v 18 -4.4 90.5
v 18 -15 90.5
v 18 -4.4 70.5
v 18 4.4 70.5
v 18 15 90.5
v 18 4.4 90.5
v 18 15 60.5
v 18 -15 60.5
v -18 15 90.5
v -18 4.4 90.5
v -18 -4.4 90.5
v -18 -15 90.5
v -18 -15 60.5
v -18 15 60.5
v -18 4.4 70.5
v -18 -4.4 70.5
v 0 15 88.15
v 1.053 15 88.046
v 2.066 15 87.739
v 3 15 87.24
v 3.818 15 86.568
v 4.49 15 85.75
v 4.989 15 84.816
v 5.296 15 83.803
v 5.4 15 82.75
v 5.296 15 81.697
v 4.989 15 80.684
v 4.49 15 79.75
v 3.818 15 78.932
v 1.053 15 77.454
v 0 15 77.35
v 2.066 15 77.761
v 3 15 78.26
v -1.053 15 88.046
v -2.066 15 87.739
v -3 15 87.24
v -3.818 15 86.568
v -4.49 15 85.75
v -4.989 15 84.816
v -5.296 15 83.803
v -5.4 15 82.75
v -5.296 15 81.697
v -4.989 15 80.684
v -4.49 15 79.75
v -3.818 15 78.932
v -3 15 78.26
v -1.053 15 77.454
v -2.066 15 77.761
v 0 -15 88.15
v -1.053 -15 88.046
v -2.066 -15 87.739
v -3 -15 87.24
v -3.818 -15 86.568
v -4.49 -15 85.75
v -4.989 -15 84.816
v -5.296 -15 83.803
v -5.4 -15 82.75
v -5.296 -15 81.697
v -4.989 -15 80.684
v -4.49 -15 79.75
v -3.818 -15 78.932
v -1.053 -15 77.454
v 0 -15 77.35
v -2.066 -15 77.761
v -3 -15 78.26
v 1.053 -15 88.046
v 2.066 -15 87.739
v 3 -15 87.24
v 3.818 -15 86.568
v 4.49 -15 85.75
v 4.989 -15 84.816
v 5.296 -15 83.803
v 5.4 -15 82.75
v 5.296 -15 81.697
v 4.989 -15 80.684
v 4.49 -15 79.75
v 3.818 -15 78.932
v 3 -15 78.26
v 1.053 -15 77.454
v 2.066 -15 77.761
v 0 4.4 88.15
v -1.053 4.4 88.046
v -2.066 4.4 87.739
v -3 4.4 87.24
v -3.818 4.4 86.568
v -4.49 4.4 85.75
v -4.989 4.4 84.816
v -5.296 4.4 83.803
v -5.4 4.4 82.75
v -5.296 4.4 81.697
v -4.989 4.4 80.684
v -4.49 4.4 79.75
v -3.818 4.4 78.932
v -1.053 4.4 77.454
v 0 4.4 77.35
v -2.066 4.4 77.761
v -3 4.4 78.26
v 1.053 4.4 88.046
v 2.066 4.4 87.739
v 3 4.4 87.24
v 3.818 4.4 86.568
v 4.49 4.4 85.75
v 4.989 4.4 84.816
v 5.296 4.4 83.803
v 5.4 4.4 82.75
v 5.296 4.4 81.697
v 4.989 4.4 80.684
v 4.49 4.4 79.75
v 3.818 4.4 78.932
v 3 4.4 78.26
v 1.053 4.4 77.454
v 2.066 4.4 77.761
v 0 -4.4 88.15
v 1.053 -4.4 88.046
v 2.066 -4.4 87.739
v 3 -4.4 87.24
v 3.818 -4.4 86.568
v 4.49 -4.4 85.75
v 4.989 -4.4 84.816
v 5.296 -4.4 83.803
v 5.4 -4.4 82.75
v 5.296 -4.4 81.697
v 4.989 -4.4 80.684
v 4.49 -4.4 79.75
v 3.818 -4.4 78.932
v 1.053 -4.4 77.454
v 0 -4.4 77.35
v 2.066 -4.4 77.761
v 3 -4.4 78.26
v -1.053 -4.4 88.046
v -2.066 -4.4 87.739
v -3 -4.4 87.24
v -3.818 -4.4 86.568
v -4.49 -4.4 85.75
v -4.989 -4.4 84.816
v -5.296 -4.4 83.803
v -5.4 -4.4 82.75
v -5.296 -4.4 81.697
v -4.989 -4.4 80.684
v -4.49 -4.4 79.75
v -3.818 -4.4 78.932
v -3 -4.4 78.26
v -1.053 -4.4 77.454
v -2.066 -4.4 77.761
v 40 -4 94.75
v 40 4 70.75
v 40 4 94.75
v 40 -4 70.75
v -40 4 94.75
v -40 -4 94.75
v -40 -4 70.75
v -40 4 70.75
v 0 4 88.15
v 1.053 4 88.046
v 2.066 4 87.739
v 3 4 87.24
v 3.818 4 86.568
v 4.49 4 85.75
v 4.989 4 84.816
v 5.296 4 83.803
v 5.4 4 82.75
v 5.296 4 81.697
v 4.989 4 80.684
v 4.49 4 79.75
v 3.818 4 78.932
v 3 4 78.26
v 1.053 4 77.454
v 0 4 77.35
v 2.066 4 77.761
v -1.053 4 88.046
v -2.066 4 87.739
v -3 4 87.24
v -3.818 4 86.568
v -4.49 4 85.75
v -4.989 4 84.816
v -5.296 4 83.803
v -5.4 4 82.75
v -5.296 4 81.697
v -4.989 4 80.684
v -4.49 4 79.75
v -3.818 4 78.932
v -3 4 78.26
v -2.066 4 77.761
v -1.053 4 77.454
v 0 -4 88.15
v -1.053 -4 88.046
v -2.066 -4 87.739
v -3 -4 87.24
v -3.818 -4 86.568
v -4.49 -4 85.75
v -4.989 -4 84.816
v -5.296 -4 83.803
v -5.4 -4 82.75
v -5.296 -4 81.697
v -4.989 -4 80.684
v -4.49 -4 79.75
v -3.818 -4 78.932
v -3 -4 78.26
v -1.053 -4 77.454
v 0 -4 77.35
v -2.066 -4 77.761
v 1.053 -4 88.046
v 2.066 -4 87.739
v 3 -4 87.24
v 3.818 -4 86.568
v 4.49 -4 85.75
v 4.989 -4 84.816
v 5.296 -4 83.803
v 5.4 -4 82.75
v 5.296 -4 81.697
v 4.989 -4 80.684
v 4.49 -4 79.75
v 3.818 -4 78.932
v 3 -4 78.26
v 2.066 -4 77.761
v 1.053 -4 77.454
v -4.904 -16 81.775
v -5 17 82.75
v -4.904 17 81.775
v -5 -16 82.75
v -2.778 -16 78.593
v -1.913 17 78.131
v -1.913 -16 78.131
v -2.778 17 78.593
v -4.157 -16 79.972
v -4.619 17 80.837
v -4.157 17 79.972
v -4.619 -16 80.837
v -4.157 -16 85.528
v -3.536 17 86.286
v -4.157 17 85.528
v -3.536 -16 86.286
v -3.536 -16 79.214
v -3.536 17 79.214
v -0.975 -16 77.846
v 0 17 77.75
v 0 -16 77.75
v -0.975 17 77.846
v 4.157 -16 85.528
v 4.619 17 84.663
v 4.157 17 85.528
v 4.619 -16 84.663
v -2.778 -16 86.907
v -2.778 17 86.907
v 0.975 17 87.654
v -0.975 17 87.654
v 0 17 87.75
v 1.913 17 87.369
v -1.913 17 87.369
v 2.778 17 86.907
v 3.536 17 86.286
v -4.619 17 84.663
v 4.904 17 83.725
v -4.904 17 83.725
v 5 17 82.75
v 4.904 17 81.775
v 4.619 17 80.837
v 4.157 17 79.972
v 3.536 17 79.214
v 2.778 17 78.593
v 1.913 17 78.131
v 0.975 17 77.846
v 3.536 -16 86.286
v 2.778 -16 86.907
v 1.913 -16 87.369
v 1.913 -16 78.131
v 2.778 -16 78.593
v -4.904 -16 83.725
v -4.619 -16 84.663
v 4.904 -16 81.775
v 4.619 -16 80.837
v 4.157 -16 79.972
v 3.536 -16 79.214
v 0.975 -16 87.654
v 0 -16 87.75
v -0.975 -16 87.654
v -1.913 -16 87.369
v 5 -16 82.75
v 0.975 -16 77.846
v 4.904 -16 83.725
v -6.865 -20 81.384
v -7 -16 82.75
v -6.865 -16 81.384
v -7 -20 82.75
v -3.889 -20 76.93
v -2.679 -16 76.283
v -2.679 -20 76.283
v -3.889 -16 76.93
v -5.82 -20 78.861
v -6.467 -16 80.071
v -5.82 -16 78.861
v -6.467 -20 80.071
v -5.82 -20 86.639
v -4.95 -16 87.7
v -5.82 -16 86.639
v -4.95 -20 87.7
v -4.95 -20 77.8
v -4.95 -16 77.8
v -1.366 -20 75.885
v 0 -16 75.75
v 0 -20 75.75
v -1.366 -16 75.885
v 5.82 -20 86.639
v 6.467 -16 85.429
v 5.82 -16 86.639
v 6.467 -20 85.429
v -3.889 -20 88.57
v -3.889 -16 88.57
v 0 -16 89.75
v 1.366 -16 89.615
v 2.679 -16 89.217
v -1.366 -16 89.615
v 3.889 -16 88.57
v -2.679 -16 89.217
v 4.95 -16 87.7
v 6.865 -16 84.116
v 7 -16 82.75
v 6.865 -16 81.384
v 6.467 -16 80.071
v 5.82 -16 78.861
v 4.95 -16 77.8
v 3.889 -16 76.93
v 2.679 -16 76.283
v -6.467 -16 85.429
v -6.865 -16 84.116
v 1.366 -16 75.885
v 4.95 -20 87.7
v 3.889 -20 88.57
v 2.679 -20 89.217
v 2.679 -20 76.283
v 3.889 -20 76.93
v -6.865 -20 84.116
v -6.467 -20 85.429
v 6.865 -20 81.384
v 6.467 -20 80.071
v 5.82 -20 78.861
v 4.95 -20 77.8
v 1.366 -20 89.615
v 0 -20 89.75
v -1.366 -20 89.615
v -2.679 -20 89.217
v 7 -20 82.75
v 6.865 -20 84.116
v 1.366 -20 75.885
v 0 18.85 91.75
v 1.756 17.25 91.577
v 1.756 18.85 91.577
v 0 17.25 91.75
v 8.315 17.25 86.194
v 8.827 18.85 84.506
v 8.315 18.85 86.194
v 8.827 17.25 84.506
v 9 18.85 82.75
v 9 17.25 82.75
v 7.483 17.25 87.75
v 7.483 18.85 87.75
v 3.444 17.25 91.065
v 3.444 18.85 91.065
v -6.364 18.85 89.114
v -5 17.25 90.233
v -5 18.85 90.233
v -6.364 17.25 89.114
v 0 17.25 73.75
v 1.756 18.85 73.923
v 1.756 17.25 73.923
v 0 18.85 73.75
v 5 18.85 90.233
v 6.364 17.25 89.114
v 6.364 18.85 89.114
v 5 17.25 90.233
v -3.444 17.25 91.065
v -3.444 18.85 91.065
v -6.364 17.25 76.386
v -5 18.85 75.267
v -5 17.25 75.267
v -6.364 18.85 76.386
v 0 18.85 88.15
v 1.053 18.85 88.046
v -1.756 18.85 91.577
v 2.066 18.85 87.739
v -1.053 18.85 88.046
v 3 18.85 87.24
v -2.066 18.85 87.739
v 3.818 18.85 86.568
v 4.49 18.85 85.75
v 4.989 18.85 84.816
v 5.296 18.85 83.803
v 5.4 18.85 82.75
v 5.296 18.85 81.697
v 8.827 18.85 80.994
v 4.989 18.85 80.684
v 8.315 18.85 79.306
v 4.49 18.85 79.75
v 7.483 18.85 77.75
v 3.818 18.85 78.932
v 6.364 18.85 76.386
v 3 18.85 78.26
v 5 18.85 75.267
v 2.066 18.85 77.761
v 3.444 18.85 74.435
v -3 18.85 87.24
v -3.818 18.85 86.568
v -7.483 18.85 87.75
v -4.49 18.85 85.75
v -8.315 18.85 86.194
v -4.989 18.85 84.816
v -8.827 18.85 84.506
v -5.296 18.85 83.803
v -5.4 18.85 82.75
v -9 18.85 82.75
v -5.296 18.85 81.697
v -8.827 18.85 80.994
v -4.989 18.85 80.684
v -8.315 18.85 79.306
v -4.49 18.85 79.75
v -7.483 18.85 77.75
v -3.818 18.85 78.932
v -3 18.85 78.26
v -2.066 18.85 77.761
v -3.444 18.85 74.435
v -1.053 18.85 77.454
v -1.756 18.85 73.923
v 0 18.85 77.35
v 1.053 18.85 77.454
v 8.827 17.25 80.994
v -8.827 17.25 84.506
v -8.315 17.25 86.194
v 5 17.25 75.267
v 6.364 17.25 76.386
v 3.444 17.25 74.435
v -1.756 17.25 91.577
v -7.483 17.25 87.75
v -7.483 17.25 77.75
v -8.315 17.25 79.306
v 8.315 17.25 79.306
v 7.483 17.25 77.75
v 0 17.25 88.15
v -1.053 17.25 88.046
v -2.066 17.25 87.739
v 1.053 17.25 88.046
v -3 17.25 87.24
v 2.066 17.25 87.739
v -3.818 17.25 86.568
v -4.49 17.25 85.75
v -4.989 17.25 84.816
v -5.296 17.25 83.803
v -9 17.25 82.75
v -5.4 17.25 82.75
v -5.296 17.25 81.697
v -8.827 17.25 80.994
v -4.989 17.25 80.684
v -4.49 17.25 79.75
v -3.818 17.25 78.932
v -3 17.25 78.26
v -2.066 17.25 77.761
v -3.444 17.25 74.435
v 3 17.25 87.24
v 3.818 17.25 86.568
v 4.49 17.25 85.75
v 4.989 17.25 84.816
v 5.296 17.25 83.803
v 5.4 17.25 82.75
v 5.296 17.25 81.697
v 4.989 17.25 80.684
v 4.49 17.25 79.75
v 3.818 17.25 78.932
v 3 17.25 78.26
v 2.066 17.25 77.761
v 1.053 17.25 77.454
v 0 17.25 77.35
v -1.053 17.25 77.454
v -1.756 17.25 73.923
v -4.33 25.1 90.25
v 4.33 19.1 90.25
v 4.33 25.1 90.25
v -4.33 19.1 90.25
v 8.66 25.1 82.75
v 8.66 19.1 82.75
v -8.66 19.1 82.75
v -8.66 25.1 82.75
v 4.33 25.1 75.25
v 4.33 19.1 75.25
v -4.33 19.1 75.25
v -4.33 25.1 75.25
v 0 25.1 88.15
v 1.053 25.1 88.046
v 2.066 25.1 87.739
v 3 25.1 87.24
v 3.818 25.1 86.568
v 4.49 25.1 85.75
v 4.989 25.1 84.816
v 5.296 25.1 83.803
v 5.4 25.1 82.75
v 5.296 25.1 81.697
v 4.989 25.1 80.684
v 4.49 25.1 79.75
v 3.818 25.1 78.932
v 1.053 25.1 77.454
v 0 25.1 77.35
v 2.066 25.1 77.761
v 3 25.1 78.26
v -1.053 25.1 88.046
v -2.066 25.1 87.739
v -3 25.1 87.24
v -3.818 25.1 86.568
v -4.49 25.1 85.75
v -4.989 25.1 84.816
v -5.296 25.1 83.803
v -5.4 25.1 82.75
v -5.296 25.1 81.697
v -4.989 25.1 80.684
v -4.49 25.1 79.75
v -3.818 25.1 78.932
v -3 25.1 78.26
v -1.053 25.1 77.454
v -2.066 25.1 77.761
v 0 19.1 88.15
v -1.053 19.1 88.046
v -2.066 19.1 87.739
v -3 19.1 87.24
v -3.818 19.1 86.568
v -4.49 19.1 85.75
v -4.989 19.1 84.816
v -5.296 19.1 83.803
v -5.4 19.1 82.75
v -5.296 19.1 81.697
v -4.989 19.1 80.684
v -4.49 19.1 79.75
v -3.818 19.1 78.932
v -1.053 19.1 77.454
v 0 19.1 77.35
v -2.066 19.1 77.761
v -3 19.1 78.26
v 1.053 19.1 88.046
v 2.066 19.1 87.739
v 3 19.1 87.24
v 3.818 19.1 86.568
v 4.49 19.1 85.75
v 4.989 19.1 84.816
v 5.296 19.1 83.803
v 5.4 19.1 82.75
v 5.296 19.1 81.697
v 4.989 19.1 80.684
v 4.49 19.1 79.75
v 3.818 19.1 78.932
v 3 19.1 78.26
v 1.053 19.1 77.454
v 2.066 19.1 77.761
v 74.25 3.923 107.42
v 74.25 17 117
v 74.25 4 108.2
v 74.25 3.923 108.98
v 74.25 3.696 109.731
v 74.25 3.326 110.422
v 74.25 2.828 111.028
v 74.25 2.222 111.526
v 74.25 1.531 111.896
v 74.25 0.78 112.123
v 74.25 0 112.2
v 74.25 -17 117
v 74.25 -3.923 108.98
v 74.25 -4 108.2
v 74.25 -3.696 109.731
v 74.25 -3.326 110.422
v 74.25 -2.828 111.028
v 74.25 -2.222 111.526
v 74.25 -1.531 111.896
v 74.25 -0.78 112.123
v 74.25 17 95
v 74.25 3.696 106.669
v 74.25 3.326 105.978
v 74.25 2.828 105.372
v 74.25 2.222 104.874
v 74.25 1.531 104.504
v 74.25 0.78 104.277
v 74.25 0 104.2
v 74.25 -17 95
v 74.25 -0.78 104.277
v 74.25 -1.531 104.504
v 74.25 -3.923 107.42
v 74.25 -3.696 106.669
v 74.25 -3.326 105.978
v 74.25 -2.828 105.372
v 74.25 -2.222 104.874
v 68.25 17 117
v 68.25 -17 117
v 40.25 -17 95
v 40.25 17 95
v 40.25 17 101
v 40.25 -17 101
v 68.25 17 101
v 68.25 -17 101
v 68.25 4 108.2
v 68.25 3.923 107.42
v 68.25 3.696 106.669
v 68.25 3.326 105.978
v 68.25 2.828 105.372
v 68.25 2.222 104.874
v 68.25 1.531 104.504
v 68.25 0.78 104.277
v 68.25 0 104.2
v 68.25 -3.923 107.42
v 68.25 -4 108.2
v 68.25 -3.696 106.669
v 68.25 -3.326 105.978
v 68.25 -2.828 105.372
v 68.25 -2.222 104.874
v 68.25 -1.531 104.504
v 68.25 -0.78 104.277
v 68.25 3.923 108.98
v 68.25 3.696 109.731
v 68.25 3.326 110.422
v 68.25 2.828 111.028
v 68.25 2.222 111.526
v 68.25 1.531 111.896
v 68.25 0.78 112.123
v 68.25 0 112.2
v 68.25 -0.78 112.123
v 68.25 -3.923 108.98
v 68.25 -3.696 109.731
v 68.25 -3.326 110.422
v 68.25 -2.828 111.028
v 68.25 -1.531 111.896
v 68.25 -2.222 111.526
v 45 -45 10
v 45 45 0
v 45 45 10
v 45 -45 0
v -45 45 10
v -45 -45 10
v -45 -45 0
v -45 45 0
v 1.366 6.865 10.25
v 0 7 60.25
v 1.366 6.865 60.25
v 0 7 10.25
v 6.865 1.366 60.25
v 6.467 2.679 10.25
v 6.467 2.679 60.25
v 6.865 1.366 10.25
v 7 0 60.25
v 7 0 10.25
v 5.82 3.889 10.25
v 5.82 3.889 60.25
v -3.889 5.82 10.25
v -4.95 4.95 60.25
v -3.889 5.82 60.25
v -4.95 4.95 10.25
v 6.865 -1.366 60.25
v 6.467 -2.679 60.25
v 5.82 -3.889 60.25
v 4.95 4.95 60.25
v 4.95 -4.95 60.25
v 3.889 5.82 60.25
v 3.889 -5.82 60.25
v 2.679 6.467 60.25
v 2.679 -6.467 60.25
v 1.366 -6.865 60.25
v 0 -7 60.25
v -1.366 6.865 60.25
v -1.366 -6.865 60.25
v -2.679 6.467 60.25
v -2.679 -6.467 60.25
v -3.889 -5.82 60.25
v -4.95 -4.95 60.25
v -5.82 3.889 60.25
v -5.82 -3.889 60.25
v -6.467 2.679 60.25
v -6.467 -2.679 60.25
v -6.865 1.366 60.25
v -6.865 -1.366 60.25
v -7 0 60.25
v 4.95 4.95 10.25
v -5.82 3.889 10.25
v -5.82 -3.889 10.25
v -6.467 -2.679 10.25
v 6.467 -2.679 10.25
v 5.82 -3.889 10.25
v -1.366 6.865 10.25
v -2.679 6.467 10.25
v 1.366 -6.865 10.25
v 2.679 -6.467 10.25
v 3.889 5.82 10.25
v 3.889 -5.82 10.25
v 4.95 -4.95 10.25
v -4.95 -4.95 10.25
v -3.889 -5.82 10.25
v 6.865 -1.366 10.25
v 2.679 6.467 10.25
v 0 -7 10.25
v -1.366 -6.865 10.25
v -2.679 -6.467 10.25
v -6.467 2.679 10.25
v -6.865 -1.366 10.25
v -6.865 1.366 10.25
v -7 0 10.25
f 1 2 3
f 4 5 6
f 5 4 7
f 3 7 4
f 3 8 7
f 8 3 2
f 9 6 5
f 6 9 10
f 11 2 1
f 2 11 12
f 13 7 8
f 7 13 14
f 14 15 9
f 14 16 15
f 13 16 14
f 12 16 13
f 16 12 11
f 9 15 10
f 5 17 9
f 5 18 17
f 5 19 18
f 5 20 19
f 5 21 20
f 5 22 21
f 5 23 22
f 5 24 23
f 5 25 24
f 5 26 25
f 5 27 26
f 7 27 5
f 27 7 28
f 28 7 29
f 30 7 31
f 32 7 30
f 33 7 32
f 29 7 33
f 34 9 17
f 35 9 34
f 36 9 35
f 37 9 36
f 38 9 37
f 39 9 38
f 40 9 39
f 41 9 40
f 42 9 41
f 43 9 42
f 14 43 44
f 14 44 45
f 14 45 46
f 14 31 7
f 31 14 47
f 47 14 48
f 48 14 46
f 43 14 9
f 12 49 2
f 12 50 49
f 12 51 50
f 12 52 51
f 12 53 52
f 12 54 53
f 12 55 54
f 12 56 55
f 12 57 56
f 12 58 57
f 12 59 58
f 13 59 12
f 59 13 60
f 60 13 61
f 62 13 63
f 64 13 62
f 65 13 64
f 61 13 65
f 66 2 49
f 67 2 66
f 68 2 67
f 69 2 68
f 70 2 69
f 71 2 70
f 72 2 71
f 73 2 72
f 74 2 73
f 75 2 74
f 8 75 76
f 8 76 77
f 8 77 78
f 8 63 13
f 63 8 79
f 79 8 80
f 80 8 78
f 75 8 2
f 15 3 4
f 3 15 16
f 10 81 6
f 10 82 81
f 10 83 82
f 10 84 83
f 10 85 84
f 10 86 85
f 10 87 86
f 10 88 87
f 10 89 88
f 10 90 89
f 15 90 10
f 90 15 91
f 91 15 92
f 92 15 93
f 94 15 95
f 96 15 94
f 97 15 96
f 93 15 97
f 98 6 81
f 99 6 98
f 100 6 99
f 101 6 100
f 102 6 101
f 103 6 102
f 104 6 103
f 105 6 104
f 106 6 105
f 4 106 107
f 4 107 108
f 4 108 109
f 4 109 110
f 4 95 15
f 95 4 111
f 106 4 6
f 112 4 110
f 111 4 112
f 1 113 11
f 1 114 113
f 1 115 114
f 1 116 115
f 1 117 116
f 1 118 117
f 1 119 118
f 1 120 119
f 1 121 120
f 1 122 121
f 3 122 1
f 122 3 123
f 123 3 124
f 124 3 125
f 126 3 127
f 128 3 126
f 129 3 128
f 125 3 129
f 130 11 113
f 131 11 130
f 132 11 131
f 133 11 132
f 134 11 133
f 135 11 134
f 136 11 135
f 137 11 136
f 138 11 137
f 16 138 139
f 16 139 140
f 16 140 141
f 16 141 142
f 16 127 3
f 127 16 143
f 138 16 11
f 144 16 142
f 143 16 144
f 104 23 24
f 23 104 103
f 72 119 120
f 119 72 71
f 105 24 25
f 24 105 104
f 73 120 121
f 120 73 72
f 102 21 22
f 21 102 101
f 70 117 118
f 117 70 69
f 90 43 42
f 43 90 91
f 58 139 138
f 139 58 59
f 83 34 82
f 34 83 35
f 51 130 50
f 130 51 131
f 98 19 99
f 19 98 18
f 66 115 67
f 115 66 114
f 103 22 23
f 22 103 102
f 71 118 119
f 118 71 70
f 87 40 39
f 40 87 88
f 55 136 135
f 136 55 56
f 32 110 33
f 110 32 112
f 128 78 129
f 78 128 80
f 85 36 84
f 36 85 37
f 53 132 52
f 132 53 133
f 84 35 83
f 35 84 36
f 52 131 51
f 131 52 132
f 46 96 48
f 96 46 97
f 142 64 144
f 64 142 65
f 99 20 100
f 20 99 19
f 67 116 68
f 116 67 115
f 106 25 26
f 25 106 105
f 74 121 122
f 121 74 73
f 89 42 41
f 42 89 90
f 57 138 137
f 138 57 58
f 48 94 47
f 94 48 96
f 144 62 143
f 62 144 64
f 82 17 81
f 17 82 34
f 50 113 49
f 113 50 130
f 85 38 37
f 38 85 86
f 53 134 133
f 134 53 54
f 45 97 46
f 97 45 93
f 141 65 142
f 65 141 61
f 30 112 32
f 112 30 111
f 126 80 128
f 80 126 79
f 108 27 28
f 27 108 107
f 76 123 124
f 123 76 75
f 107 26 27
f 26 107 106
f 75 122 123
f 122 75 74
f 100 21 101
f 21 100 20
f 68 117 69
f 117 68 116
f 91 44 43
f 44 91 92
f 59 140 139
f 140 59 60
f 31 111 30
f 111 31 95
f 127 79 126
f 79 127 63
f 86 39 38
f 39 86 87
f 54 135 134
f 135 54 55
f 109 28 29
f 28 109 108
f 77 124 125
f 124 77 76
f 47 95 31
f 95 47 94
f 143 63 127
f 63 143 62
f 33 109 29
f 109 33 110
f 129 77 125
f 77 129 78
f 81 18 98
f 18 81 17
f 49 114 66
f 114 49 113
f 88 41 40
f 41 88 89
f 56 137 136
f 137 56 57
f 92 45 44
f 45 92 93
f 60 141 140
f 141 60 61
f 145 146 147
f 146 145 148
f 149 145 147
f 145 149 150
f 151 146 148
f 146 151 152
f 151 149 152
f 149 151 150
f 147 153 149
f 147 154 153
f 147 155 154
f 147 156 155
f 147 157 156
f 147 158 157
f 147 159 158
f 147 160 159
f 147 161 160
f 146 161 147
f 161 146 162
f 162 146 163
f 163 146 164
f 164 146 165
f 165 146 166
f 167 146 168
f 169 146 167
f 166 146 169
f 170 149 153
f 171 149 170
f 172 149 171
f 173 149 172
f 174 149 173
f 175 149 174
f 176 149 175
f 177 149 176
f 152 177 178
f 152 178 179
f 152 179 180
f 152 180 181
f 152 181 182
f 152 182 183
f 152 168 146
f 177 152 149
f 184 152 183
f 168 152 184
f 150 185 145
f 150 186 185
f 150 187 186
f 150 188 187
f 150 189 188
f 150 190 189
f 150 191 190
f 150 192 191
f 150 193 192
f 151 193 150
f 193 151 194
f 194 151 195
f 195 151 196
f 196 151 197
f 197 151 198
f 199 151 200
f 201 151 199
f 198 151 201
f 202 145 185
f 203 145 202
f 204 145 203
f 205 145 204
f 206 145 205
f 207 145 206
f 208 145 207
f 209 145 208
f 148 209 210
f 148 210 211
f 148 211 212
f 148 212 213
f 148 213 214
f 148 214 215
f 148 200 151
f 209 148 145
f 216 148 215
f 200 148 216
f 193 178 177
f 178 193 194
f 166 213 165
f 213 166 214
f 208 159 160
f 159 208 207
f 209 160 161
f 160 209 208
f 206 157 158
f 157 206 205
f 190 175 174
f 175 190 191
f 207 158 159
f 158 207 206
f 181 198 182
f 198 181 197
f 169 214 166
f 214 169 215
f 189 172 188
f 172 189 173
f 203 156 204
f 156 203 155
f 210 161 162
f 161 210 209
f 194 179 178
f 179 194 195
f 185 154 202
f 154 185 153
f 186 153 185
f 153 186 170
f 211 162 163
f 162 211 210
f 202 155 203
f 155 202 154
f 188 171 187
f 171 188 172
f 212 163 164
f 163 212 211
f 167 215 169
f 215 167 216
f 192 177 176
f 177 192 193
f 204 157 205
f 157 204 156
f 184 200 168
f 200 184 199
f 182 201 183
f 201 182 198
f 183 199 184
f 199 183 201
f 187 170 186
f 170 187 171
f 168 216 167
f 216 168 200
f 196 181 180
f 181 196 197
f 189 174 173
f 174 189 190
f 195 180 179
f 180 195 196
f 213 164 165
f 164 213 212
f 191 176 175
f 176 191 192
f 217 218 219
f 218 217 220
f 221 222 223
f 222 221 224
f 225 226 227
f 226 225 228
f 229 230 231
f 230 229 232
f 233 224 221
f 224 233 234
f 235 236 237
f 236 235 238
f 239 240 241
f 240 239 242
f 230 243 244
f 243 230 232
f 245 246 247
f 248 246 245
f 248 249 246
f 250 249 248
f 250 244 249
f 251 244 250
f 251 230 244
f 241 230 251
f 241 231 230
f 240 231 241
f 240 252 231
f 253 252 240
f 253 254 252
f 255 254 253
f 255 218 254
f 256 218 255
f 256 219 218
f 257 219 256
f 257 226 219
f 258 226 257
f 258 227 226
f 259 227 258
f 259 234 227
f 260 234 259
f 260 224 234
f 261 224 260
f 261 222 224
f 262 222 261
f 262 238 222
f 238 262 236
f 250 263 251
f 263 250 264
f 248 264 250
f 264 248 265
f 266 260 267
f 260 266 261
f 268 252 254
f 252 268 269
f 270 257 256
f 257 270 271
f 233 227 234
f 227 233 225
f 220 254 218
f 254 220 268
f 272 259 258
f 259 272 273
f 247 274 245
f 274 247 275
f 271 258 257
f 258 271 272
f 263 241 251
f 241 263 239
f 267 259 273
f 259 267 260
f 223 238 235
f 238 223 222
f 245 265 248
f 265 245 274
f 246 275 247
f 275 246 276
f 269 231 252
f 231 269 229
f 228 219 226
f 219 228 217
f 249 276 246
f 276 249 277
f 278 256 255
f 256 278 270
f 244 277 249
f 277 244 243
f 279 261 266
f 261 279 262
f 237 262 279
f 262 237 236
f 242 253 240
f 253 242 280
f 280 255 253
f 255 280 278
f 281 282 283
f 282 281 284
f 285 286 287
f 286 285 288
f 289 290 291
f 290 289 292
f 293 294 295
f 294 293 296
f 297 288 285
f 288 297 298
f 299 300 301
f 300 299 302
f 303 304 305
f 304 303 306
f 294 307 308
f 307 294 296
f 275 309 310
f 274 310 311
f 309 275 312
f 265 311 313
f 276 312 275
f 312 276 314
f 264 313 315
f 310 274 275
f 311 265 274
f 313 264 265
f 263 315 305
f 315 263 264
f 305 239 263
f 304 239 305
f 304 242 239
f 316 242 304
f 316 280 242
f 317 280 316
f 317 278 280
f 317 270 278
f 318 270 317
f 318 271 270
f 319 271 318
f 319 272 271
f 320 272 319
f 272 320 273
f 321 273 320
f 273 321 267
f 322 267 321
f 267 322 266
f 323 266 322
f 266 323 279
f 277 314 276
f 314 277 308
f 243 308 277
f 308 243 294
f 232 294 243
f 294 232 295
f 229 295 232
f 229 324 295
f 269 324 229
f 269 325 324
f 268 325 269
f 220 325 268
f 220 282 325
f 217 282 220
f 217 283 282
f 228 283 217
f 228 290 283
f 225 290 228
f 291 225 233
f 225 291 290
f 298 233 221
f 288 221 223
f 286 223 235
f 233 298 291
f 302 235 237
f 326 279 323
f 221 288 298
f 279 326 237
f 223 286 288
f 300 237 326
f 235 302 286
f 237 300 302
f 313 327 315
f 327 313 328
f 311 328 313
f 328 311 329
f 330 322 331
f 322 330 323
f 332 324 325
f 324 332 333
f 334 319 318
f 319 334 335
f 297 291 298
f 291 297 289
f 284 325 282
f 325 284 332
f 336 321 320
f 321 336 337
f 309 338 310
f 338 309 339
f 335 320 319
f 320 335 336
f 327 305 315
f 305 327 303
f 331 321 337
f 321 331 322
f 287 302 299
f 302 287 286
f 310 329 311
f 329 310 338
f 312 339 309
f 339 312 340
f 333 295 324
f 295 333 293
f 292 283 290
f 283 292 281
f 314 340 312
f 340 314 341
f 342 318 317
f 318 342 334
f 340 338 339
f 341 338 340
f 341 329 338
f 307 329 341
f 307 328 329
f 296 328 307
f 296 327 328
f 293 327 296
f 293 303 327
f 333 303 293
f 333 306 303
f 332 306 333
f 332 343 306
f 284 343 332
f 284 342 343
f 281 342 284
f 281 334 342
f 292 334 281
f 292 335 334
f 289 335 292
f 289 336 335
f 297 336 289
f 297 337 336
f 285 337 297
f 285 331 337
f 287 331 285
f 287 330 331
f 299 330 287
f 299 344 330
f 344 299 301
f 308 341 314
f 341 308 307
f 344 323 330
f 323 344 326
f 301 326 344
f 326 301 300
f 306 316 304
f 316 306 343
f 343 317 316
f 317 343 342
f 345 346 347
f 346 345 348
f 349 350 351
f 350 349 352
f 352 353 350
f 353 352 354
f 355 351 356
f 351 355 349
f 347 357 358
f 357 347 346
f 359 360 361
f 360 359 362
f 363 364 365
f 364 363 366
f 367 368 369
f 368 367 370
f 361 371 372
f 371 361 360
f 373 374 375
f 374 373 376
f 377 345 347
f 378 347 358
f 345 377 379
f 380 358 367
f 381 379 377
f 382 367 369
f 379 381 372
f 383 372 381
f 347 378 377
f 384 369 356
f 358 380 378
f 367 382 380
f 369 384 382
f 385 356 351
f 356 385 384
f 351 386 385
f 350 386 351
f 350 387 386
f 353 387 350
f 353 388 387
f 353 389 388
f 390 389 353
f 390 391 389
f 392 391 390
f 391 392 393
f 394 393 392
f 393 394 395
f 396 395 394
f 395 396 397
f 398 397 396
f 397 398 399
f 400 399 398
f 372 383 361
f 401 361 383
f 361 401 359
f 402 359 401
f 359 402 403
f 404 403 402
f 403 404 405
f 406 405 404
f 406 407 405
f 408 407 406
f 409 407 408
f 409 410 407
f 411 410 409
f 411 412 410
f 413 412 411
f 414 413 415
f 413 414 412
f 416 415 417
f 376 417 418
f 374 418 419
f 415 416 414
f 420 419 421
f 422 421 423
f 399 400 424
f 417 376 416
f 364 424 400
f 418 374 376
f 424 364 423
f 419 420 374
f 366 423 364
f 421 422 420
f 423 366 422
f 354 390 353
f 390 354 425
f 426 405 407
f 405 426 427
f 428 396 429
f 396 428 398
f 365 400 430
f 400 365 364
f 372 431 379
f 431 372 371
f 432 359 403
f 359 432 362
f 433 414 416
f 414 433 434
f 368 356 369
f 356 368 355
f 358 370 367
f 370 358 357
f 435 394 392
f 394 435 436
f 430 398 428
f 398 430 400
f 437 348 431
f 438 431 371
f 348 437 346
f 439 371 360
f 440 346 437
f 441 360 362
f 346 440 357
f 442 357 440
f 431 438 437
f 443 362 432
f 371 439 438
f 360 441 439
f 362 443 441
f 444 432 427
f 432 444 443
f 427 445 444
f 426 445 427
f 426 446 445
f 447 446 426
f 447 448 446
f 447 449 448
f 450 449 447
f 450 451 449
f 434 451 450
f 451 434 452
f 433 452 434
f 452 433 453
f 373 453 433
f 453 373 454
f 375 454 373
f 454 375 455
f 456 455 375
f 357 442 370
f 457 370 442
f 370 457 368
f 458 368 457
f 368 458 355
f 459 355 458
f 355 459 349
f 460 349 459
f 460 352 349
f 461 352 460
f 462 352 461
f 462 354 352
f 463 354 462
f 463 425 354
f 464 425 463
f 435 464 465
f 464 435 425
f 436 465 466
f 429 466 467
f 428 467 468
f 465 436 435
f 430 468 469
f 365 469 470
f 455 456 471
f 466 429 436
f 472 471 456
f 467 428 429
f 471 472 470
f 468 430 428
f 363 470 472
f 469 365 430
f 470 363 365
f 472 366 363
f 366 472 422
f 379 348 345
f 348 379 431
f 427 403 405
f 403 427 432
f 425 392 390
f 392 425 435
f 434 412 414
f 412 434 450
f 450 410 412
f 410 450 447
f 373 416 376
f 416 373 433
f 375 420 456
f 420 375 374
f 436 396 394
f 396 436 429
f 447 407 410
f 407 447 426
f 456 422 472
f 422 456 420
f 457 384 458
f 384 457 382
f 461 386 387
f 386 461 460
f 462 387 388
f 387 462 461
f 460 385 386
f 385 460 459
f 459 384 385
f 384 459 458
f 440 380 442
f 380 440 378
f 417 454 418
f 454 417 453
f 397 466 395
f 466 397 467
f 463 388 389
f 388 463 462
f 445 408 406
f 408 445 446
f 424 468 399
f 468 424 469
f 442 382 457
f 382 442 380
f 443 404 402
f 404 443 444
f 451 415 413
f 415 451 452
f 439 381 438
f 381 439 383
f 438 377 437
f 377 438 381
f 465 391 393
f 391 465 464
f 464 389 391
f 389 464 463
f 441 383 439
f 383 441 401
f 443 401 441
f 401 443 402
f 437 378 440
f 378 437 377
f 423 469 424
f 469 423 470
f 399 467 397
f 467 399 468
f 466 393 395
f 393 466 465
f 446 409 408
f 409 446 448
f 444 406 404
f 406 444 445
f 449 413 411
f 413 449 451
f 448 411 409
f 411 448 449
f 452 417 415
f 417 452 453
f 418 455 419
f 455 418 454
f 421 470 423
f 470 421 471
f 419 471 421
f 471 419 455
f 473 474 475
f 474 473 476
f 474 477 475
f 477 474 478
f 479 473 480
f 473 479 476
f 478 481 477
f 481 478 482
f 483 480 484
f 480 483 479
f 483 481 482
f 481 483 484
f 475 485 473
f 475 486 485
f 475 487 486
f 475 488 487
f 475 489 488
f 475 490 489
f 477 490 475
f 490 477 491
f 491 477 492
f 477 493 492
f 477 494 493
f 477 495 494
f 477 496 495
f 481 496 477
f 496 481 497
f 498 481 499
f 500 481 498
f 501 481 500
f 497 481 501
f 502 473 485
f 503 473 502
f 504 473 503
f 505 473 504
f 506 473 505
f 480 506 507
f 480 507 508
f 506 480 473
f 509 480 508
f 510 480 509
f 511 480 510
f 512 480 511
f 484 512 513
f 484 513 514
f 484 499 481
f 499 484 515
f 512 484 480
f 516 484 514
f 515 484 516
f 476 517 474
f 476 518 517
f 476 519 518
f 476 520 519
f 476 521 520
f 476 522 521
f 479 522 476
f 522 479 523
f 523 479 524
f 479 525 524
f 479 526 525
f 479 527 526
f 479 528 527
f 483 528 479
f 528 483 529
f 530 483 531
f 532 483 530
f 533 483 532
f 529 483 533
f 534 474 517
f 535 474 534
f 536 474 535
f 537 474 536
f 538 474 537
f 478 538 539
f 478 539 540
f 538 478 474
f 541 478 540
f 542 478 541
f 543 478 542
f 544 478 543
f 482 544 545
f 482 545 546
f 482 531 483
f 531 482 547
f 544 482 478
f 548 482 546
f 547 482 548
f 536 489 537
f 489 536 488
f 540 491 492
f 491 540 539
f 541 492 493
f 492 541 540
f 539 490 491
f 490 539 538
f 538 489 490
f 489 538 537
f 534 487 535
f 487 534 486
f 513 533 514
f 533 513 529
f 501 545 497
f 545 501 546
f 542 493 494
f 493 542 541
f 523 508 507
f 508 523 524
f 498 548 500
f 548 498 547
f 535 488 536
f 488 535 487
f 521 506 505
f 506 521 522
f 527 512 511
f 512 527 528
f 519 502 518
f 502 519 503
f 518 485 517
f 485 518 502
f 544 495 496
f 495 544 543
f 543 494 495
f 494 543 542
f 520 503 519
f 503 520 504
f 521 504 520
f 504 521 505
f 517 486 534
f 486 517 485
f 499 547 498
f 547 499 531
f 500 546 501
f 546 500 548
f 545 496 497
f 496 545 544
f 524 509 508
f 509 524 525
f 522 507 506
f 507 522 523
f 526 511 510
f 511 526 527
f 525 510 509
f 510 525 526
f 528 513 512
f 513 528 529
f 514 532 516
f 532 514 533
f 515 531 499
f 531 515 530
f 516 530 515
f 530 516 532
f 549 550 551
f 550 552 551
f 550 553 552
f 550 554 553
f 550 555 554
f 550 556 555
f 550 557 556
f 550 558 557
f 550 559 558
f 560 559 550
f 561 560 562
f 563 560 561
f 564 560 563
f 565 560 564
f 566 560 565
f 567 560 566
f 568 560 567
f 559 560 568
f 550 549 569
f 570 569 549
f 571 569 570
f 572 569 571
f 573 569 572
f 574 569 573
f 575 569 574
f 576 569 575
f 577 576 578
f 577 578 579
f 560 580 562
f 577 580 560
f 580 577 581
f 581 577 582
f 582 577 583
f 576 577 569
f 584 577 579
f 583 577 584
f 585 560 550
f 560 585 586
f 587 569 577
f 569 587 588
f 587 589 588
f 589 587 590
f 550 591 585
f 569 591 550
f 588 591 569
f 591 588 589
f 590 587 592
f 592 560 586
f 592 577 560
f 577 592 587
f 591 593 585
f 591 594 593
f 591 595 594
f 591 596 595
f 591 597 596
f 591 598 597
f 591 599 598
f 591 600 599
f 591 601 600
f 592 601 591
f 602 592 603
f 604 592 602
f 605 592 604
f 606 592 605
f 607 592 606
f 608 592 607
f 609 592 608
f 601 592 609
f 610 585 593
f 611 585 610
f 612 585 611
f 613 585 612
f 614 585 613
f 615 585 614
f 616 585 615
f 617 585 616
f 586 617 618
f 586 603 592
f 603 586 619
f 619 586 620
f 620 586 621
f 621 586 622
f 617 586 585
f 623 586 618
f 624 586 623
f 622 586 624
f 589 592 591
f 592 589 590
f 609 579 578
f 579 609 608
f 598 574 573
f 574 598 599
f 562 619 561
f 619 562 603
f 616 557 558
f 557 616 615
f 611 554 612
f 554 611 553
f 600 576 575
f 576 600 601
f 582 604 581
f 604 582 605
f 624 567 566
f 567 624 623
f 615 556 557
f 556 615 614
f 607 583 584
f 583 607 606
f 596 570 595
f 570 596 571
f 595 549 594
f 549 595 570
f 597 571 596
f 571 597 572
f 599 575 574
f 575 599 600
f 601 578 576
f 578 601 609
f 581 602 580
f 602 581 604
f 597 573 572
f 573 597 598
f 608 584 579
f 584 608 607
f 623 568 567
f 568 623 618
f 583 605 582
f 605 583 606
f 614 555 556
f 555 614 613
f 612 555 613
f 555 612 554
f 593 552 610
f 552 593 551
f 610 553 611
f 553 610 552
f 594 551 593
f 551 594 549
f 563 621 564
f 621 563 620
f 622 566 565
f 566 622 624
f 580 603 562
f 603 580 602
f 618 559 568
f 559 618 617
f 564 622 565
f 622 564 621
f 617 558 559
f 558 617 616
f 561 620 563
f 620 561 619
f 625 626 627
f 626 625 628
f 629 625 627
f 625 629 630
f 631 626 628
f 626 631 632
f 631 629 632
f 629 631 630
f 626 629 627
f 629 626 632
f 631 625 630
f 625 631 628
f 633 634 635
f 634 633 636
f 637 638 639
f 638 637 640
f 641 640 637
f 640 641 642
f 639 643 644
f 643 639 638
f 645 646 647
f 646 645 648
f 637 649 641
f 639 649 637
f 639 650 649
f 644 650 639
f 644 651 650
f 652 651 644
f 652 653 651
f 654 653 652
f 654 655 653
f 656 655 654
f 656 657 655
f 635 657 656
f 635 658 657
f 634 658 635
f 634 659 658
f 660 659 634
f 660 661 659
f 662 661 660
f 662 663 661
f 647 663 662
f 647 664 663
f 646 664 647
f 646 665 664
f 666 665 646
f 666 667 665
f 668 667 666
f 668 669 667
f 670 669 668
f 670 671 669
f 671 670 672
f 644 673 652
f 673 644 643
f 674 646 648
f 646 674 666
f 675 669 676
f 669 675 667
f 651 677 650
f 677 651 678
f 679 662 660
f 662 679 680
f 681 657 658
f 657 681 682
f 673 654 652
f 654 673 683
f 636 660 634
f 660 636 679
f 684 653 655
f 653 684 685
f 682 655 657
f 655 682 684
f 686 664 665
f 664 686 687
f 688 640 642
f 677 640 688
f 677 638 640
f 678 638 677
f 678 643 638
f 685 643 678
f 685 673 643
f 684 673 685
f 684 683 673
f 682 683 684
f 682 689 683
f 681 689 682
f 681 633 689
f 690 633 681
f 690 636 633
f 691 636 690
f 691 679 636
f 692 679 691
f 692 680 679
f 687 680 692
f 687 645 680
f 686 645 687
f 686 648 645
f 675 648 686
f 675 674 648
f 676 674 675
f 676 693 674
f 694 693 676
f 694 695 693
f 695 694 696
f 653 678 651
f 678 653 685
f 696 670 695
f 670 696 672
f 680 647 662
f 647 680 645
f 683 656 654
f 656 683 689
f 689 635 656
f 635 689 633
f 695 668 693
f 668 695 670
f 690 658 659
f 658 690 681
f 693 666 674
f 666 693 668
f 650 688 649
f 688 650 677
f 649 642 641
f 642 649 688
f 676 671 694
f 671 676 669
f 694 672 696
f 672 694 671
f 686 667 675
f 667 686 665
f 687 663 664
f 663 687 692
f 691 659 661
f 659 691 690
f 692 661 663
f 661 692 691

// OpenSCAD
$fn = 32;

// ------------------------------------------------------------------------
// Lamp arm: column d14 x 50 mm, arm 80 mm
// Every part is its own module, assembly() places every instance.
// ------------------------------------------------------------------------

// --- part 1 ---
module lamp_base() {
  difference() {
    translate([-45, -45, 0]) cube([90, 90, 10]);
  }
}

// --- part 2 ---
module lamp_column() {
  cylinder(h = 50, d = 14);
}

// --- part 3 ---
module head_fork() {
  difference() {
    translate([-18, -15, 0]) cube([36, 30, 30]);
    translate([-19, -4.4, 10]) cube([38, 8.8, 21]);
    translate([0, 0, 22.25]) rotate([90, 0, 0]) cylinder(h = 32, d = 10.8, center = true);
  }
}

// --- part 4 ---
module lamp_arm() {
  difference() {
    translate([-40, -4, 0]) cube([80, 8, 24]);
    translate([0, 0, 12]) rotate([90, 0, 0]) cylinder(h = 10, d = 10.8, center = true);
  }
}

// --- part 5 ---
module arm_pin() {
  rotate([0, 90, 0]) cylinder(h = 34, d = 10, center = true);
  translate([-20, 0, 0]) rotate([0, 90, 0]) cylinder(h = 4, d = 14);
}

// --- part 6 ---
module arm_washer() {
  difference() {
      translate([0, 0, 0]) cylinder(h = 1.6, d = 18);
      translate([0, 0, -1]) cylinder(h = 3.6, d = 10.8);
    }
}

// --- part 7 ---
module arm_nut() {
  difference() {
    linear_extrude(height = 6) polygon(points = [[8.66, 0], [4.33, 7.5], [-4.33, 7.5], [-8.66, 0], [-4.33, -7.5], [4.33, -7.5]]);
    translate([0, 0, -1]) cylinder(h = 8, d = 10.8);
  }
}

// --- part 8 ---
module shade_bracket() {
  difference() {
    translate([-17, -17, 0]) cube([34, 34, 22]);
    translate([-18, -18, 6]) cube([29, 36, 17]);
    translate([14, 0, 13.2]) rotate([0, 90, 0]) cylinder(h = 8, d = 8, center = true);
  }
}

// --- assembly ---
module assembly() {
  color([0.80, 0.24, 0.20]) translate([0, 0, 0]) rotate([0, 0, 0]) lamp_base();
  color([0.20, 0.45, 0.75]) translate([0, 0, 10.25]) rotate([0, 0, 0]) lamp_column();
  color([0.25, 0.62, 0.32]) translate([0, 0, 60.5]) rotate([0, 0, 0]) head_fork();
  color([0.92, 0.70, 0.18]) translate([0, 0, 70.75]) rotate([0, 0, 0]) lamp_arm();
  color([0.58, 0.35, 0.70]) translate([0, 0, 82.75]) rotate([0, 0, 90]) arm_pin();
  color([0.16, 0.66, 0.66]) translate([0, 18.85, 82.75]) rotate([90, 0, 0]) arm_washer();
  color([0.85, 0.48, 0.18]) translate([0, 25.1, 82.75]) rotate([90, 0, 0]) arm_nut();
  color([0.55, 0.60, 0.65]) translate([57.25, 0, 95]) rotate([0, 0, 0]) shade_bracket();
}

assembly();
